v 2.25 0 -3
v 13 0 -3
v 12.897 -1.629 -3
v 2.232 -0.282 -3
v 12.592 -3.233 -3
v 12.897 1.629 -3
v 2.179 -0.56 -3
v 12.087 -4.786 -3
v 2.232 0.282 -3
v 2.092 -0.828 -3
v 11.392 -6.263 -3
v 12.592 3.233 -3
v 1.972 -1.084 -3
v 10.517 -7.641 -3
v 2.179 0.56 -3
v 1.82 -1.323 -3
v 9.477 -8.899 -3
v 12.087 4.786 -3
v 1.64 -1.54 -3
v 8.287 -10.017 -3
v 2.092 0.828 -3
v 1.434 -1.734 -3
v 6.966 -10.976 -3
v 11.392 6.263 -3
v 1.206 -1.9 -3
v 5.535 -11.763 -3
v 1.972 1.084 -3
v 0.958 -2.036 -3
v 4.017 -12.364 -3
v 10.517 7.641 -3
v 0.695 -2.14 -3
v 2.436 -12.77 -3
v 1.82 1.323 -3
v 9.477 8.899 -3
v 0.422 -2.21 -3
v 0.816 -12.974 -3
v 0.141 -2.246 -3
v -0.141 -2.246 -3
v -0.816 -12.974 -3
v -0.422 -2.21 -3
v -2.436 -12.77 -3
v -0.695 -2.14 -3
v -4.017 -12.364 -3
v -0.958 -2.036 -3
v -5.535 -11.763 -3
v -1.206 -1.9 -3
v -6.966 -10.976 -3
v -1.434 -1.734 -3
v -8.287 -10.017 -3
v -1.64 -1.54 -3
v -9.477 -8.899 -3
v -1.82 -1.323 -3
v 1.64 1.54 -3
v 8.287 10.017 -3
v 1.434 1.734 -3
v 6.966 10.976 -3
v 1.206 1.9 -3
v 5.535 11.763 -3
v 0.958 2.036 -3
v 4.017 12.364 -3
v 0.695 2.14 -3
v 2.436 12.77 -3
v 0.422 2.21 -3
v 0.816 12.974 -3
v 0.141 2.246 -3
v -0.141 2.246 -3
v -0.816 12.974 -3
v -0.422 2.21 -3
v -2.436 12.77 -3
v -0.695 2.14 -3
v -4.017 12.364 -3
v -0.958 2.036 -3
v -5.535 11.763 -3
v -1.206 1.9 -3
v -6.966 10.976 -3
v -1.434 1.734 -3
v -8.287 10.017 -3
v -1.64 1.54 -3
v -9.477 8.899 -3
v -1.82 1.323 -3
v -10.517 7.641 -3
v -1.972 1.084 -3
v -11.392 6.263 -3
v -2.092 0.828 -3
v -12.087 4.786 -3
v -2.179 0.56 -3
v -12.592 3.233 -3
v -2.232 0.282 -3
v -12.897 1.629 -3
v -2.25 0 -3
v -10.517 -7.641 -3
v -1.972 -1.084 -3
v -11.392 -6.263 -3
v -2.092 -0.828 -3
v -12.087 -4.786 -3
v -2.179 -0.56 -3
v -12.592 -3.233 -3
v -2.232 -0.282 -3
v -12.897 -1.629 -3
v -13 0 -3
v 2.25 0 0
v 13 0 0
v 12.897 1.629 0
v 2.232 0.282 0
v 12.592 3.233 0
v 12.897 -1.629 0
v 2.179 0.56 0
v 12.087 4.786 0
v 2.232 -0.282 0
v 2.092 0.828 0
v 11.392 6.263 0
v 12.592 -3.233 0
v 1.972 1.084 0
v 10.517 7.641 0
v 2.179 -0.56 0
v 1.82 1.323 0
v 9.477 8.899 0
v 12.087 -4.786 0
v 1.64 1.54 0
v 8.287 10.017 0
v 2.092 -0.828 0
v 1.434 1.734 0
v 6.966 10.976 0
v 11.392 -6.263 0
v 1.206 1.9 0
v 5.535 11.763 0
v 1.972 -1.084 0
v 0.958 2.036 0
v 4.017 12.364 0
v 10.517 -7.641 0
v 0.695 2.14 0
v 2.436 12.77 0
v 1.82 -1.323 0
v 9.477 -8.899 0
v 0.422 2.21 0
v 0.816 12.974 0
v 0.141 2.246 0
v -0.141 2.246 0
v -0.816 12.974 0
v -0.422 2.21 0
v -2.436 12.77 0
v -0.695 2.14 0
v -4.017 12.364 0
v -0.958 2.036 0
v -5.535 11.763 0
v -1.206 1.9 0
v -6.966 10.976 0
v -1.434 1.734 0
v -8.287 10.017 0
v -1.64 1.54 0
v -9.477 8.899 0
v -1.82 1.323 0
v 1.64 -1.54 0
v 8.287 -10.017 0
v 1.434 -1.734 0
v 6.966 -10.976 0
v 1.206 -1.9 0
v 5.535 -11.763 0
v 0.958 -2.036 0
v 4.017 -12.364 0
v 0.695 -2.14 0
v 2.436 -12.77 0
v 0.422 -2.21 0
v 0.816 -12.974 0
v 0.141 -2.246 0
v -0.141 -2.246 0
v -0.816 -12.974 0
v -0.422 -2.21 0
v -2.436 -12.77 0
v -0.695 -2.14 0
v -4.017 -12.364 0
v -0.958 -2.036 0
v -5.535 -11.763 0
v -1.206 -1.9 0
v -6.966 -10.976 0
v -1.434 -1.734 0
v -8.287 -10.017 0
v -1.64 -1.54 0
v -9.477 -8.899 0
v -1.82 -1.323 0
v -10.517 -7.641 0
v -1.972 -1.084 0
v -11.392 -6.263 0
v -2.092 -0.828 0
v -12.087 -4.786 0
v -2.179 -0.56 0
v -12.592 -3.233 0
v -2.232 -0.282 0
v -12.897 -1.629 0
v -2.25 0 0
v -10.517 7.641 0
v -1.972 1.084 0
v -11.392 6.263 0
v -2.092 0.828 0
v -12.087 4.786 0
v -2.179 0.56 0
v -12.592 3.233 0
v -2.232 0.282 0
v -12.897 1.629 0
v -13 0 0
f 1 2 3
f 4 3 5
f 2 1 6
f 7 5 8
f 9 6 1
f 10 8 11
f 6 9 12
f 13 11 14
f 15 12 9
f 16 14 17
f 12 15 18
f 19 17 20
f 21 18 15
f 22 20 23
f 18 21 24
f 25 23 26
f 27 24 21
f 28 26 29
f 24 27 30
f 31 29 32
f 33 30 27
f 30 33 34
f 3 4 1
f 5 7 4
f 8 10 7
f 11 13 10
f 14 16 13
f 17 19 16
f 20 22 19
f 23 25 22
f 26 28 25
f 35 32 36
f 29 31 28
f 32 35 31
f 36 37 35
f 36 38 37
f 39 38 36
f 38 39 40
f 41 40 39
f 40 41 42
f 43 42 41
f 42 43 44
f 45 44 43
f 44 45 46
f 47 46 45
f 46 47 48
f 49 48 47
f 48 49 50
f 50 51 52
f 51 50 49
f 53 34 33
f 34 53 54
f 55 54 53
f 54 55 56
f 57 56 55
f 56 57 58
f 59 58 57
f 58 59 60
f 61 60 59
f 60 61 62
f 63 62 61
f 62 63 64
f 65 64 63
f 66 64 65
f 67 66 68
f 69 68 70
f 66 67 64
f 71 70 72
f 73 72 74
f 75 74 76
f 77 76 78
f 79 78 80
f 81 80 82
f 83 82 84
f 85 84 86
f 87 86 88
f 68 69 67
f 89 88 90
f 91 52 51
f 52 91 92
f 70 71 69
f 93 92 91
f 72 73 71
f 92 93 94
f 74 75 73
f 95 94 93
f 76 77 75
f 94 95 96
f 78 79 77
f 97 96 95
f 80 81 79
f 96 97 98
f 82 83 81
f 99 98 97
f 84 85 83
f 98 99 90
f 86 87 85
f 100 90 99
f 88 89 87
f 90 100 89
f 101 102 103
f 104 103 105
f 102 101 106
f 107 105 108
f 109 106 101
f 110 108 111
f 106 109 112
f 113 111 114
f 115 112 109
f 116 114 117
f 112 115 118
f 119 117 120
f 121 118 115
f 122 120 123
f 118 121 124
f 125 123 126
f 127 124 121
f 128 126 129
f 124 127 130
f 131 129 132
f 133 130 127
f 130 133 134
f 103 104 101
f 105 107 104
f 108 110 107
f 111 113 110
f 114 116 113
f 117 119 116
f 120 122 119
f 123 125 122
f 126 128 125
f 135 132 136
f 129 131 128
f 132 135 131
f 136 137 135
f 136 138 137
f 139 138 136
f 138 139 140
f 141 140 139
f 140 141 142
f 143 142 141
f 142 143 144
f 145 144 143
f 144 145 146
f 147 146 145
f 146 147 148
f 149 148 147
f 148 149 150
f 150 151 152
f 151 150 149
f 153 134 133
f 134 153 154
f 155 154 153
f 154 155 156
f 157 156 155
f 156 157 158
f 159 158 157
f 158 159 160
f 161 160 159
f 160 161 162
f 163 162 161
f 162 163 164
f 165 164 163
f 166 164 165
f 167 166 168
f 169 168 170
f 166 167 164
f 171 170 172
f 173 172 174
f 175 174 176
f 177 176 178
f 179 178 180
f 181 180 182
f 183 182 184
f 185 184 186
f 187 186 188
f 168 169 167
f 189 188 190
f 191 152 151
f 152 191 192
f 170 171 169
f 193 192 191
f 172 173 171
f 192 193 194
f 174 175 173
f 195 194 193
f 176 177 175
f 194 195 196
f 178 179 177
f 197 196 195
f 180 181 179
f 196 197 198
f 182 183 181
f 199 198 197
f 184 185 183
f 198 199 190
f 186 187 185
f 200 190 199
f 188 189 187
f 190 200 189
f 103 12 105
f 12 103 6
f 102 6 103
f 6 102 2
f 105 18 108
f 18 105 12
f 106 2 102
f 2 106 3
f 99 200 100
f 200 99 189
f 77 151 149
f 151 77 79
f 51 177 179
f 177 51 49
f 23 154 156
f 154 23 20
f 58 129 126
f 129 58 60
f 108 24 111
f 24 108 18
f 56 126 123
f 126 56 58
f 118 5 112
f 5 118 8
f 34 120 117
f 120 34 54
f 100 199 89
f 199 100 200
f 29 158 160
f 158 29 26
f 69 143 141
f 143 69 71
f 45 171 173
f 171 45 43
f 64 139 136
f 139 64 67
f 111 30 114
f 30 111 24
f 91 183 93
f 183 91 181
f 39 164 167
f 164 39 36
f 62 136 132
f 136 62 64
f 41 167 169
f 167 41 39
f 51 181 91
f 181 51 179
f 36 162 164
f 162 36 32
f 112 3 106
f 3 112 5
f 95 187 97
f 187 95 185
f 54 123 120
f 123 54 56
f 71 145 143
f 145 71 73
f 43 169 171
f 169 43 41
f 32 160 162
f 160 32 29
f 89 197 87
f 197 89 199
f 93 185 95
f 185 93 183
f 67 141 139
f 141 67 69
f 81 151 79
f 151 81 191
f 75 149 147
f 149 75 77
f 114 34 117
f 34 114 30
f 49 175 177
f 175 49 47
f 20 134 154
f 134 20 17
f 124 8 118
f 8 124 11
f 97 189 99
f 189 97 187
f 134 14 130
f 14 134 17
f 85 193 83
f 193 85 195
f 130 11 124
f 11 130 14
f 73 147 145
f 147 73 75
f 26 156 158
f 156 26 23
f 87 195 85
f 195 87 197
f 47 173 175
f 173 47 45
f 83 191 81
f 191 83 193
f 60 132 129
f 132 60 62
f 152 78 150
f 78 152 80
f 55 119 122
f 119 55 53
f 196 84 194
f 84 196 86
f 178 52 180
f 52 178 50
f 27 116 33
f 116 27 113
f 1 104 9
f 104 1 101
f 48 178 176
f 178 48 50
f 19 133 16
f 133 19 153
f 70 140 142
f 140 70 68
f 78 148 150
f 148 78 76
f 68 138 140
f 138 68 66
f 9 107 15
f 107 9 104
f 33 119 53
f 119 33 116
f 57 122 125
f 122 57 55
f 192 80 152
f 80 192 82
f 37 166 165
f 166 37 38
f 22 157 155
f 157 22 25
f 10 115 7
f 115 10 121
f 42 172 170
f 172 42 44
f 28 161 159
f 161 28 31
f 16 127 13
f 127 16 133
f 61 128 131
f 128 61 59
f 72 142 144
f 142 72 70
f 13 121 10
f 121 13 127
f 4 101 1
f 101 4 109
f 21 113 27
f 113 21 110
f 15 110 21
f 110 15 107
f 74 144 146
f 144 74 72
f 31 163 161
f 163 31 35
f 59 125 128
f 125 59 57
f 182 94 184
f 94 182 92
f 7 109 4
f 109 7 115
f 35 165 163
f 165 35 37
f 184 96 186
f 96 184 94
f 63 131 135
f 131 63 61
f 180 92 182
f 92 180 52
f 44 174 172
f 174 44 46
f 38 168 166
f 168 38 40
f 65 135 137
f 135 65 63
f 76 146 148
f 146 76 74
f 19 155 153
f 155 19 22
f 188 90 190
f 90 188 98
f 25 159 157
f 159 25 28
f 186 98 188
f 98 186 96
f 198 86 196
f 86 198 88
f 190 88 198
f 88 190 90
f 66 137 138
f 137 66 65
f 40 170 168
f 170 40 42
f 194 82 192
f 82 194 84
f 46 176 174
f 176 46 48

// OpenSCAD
$fn = 50;


difference() {
	union() {
		translate(v = [0, 0, -3.0000000000]) {
			cylinder(h = 3, r = 10.0000000000);
		}
		translate(v = [0, 0, -3.0000000000]) {
			cylinder(h = 3, r = 13.0000000000);
		}
	}
	union() {
		#translate(v = [0, 0, -3]) {
			cylinder(h = 3, r = 2.2500000000);
		}
	}
}
